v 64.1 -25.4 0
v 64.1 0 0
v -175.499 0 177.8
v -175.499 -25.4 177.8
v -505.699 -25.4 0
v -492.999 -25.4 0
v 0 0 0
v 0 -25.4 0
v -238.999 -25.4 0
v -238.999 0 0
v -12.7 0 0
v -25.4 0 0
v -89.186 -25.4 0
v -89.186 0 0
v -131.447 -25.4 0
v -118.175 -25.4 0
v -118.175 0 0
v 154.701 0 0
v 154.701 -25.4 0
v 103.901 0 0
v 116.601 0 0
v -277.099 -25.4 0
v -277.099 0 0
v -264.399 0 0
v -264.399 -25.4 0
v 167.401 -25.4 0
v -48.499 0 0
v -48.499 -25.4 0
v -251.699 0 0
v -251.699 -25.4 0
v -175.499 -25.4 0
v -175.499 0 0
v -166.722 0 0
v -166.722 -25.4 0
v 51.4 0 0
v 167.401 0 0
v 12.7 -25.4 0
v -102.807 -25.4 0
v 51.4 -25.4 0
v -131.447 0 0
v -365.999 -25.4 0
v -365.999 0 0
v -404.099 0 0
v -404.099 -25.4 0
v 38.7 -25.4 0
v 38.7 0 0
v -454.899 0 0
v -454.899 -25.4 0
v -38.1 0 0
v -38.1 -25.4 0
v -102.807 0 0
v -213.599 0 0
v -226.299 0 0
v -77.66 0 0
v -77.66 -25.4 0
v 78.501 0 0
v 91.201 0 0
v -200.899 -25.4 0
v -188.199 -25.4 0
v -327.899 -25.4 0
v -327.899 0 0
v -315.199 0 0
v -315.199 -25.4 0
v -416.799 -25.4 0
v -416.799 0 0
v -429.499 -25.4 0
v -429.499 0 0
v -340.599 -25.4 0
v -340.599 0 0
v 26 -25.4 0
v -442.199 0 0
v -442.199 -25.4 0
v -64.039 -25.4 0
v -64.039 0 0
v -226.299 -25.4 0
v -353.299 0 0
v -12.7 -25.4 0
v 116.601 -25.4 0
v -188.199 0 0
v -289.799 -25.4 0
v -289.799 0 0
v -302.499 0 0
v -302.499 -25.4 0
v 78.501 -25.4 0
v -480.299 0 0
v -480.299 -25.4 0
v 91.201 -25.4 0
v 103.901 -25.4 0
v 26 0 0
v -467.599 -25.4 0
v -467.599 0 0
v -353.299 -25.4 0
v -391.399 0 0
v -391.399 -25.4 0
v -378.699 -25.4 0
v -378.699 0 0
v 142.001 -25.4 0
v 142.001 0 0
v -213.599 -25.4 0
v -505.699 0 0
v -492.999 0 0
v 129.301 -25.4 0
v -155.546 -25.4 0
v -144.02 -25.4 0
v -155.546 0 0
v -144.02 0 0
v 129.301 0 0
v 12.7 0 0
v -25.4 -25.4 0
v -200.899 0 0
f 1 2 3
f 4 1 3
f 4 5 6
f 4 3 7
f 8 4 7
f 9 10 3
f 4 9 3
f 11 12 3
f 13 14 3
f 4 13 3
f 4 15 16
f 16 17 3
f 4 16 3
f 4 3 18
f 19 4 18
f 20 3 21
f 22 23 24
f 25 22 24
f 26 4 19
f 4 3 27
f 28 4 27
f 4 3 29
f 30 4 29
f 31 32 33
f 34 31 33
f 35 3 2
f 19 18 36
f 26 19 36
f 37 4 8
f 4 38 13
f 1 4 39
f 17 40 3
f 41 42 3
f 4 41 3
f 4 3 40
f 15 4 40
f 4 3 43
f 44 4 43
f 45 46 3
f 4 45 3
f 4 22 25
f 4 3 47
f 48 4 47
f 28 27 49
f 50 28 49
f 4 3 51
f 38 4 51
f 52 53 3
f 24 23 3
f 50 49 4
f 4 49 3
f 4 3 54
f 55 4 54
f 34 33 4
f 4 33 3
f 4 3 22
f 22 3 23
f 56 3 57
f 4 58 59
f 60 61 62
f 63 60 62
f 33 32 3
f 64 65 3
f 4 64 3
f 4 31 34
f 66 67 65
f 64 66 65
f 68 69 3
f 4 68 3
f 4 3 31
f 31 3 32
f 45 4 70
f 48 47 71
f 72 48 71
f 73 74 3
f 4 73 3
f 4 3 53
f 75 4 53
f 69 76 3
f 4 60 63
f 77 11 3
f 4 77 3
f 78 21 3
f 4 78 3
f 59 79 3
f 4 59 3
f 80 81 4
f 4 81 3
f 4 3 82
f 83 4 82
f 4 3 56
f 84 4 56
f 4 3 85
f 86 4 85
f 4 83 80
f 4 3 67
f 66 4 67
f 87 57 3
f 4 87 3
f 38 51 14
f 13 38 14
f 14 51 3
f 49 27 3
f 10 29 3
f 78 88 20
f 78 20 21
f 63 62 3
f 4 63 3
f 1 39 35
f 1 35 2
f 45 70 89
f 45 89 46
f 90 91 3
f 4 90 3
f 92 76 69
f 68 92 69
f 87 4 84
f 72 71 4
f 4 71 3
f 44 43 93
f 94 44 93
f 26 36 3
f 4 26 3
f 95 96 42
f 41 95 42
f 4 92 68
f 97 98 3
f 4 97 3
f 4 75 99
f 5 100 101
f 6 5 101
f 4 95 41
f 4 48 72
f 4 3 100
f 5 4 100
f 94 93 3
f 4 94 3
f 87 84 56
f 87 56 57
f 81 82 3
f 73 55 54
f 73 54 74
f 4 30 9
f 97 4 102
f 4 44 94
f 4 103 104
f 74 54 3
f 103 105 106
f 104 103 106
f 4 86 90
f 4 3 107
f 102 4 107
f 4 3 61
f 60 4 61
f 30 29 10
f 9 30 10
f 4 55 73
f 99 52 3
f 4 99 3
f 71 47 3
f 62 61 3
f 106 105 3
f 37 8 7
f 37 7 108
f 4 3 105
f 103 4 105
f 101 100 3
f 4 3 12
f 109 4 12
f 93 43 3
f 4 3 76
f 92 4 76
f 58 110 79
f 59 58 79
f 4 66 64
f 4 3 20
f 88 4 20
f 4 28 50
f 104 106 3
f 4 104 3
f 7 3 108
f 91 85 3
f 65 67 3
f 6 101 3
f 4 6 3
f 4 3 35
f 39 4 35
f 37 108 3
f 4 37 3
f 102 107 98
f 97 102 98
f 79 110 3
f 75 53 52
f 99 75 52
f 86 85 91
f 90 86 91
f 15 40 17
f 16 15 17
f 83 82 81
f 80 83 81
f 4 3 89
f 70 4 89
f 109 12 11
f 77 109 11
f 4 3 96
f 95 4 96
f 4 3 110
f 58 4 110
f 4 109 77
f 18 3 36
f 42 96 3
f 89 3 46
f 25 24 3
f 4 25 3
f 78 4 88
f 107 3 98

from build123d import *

# Parameters (mm, degrees)
F1_DEPTH = 25.4


with BuildPart() as f1:
    # F0 (on Front) → F1 (new body)
    with BuildSketch(Plane.XZ):
        Polygon((-166.722268, 0), (-175.498977, 177.8), (-175.498977, 0), align=None)
        Polygon((-144.02023, 0), (-175.498977, 177.8), (-155.545875, 0), align=None)
        Polygon((-118.174836, 0), (-175.498977, 177.8), (-131.446794, 0), align=None)
        Polygon((-89.18608, 0), (-175.498977, 177.8), (-102.807306, 0), align=None)
        Polygon((-64.039215, 0), (-175.498977, 177.8), (-77.660434, 0), align=None)
        Polygon((-38.1, 0), (-175.498977, 177.8), (-48.498977, 0), align=None)
        Polygon((-12.7, 0), (-175.498977, 177.8), (-25.4, 0), align=None)
        Polygon((12.7, 0), (-175.498977, 177.8), (0, 0), align=None)
        Polygon((38.699876, 0), (-175.498977, 177.8), (25.999876, 0), align=None)
        Polygon((51.399876, 0), (64.099876, 0), (-175.498977, 177.8), align=None)
        Polygon((-175.498977, 177.8), (78.501023, 0), (91.201023, 0), align=None)
        Polygon((116.601023, 0), (-175.498977, 177.8), (103.901023, 0), align=None)
        Polygon((142.001023, 0), (-175.498977, 177.8), (129.301023, 0), align=None)
        Polygon((167.401023, 0), (-175.498977, 177.8), (154.701023, 0), align=None)
        Polygon((-188.198977, 0), (-175.498977, 177.8), (-200.898977, 0), align=None)
        Polygon((-213.598977, 0), (-175.498977, 177.8), (-226.298977, 0), align=None)
        Polygon((-238.998977, 0), (-175.498977, 177.8), (-251.698977, 0), align=None)
        Polygon((-264.398977, 0), (-175.498977, 177.8), (-277.098977, 0), align=None)
        Polygon((-289.798977, 0), (-175.498977, 177.8), (-302.498977, 0), align=None)
        Polygon((-315.198977, 0), (-175.498977, 177.8), (-327.898977, 0), align=None)
        Polygon((-340.598977, 0), (-175.498977, 177.8), (-353.298977, 0), align=None)
        Polygon((-365.998977, 0), (-175.498977, 177.8), (-378.698977, 0), align=None)
        Polygon((-391.398977, 0), (-175.498977, 177.8), (-404.098977, 0), align=None)
        Polygon((-416.798977, 0), (-175.498977, 177.8), (-429.498977, 0), align=None)
        Polygon((-442.198977, 0), (-175.498977, 177.8), (-454.898977, 0), align=None)
        Polygon((-467.598977, 0), (-175.498977, 177.8), (-480.298977, 0), align=None)
        Polygon((-492.998977, 0), (-175.498977, 177.8), (-505.698977, 0), align=None)
    extrude(amount=F1_DEPTH)


solid = f1.part
